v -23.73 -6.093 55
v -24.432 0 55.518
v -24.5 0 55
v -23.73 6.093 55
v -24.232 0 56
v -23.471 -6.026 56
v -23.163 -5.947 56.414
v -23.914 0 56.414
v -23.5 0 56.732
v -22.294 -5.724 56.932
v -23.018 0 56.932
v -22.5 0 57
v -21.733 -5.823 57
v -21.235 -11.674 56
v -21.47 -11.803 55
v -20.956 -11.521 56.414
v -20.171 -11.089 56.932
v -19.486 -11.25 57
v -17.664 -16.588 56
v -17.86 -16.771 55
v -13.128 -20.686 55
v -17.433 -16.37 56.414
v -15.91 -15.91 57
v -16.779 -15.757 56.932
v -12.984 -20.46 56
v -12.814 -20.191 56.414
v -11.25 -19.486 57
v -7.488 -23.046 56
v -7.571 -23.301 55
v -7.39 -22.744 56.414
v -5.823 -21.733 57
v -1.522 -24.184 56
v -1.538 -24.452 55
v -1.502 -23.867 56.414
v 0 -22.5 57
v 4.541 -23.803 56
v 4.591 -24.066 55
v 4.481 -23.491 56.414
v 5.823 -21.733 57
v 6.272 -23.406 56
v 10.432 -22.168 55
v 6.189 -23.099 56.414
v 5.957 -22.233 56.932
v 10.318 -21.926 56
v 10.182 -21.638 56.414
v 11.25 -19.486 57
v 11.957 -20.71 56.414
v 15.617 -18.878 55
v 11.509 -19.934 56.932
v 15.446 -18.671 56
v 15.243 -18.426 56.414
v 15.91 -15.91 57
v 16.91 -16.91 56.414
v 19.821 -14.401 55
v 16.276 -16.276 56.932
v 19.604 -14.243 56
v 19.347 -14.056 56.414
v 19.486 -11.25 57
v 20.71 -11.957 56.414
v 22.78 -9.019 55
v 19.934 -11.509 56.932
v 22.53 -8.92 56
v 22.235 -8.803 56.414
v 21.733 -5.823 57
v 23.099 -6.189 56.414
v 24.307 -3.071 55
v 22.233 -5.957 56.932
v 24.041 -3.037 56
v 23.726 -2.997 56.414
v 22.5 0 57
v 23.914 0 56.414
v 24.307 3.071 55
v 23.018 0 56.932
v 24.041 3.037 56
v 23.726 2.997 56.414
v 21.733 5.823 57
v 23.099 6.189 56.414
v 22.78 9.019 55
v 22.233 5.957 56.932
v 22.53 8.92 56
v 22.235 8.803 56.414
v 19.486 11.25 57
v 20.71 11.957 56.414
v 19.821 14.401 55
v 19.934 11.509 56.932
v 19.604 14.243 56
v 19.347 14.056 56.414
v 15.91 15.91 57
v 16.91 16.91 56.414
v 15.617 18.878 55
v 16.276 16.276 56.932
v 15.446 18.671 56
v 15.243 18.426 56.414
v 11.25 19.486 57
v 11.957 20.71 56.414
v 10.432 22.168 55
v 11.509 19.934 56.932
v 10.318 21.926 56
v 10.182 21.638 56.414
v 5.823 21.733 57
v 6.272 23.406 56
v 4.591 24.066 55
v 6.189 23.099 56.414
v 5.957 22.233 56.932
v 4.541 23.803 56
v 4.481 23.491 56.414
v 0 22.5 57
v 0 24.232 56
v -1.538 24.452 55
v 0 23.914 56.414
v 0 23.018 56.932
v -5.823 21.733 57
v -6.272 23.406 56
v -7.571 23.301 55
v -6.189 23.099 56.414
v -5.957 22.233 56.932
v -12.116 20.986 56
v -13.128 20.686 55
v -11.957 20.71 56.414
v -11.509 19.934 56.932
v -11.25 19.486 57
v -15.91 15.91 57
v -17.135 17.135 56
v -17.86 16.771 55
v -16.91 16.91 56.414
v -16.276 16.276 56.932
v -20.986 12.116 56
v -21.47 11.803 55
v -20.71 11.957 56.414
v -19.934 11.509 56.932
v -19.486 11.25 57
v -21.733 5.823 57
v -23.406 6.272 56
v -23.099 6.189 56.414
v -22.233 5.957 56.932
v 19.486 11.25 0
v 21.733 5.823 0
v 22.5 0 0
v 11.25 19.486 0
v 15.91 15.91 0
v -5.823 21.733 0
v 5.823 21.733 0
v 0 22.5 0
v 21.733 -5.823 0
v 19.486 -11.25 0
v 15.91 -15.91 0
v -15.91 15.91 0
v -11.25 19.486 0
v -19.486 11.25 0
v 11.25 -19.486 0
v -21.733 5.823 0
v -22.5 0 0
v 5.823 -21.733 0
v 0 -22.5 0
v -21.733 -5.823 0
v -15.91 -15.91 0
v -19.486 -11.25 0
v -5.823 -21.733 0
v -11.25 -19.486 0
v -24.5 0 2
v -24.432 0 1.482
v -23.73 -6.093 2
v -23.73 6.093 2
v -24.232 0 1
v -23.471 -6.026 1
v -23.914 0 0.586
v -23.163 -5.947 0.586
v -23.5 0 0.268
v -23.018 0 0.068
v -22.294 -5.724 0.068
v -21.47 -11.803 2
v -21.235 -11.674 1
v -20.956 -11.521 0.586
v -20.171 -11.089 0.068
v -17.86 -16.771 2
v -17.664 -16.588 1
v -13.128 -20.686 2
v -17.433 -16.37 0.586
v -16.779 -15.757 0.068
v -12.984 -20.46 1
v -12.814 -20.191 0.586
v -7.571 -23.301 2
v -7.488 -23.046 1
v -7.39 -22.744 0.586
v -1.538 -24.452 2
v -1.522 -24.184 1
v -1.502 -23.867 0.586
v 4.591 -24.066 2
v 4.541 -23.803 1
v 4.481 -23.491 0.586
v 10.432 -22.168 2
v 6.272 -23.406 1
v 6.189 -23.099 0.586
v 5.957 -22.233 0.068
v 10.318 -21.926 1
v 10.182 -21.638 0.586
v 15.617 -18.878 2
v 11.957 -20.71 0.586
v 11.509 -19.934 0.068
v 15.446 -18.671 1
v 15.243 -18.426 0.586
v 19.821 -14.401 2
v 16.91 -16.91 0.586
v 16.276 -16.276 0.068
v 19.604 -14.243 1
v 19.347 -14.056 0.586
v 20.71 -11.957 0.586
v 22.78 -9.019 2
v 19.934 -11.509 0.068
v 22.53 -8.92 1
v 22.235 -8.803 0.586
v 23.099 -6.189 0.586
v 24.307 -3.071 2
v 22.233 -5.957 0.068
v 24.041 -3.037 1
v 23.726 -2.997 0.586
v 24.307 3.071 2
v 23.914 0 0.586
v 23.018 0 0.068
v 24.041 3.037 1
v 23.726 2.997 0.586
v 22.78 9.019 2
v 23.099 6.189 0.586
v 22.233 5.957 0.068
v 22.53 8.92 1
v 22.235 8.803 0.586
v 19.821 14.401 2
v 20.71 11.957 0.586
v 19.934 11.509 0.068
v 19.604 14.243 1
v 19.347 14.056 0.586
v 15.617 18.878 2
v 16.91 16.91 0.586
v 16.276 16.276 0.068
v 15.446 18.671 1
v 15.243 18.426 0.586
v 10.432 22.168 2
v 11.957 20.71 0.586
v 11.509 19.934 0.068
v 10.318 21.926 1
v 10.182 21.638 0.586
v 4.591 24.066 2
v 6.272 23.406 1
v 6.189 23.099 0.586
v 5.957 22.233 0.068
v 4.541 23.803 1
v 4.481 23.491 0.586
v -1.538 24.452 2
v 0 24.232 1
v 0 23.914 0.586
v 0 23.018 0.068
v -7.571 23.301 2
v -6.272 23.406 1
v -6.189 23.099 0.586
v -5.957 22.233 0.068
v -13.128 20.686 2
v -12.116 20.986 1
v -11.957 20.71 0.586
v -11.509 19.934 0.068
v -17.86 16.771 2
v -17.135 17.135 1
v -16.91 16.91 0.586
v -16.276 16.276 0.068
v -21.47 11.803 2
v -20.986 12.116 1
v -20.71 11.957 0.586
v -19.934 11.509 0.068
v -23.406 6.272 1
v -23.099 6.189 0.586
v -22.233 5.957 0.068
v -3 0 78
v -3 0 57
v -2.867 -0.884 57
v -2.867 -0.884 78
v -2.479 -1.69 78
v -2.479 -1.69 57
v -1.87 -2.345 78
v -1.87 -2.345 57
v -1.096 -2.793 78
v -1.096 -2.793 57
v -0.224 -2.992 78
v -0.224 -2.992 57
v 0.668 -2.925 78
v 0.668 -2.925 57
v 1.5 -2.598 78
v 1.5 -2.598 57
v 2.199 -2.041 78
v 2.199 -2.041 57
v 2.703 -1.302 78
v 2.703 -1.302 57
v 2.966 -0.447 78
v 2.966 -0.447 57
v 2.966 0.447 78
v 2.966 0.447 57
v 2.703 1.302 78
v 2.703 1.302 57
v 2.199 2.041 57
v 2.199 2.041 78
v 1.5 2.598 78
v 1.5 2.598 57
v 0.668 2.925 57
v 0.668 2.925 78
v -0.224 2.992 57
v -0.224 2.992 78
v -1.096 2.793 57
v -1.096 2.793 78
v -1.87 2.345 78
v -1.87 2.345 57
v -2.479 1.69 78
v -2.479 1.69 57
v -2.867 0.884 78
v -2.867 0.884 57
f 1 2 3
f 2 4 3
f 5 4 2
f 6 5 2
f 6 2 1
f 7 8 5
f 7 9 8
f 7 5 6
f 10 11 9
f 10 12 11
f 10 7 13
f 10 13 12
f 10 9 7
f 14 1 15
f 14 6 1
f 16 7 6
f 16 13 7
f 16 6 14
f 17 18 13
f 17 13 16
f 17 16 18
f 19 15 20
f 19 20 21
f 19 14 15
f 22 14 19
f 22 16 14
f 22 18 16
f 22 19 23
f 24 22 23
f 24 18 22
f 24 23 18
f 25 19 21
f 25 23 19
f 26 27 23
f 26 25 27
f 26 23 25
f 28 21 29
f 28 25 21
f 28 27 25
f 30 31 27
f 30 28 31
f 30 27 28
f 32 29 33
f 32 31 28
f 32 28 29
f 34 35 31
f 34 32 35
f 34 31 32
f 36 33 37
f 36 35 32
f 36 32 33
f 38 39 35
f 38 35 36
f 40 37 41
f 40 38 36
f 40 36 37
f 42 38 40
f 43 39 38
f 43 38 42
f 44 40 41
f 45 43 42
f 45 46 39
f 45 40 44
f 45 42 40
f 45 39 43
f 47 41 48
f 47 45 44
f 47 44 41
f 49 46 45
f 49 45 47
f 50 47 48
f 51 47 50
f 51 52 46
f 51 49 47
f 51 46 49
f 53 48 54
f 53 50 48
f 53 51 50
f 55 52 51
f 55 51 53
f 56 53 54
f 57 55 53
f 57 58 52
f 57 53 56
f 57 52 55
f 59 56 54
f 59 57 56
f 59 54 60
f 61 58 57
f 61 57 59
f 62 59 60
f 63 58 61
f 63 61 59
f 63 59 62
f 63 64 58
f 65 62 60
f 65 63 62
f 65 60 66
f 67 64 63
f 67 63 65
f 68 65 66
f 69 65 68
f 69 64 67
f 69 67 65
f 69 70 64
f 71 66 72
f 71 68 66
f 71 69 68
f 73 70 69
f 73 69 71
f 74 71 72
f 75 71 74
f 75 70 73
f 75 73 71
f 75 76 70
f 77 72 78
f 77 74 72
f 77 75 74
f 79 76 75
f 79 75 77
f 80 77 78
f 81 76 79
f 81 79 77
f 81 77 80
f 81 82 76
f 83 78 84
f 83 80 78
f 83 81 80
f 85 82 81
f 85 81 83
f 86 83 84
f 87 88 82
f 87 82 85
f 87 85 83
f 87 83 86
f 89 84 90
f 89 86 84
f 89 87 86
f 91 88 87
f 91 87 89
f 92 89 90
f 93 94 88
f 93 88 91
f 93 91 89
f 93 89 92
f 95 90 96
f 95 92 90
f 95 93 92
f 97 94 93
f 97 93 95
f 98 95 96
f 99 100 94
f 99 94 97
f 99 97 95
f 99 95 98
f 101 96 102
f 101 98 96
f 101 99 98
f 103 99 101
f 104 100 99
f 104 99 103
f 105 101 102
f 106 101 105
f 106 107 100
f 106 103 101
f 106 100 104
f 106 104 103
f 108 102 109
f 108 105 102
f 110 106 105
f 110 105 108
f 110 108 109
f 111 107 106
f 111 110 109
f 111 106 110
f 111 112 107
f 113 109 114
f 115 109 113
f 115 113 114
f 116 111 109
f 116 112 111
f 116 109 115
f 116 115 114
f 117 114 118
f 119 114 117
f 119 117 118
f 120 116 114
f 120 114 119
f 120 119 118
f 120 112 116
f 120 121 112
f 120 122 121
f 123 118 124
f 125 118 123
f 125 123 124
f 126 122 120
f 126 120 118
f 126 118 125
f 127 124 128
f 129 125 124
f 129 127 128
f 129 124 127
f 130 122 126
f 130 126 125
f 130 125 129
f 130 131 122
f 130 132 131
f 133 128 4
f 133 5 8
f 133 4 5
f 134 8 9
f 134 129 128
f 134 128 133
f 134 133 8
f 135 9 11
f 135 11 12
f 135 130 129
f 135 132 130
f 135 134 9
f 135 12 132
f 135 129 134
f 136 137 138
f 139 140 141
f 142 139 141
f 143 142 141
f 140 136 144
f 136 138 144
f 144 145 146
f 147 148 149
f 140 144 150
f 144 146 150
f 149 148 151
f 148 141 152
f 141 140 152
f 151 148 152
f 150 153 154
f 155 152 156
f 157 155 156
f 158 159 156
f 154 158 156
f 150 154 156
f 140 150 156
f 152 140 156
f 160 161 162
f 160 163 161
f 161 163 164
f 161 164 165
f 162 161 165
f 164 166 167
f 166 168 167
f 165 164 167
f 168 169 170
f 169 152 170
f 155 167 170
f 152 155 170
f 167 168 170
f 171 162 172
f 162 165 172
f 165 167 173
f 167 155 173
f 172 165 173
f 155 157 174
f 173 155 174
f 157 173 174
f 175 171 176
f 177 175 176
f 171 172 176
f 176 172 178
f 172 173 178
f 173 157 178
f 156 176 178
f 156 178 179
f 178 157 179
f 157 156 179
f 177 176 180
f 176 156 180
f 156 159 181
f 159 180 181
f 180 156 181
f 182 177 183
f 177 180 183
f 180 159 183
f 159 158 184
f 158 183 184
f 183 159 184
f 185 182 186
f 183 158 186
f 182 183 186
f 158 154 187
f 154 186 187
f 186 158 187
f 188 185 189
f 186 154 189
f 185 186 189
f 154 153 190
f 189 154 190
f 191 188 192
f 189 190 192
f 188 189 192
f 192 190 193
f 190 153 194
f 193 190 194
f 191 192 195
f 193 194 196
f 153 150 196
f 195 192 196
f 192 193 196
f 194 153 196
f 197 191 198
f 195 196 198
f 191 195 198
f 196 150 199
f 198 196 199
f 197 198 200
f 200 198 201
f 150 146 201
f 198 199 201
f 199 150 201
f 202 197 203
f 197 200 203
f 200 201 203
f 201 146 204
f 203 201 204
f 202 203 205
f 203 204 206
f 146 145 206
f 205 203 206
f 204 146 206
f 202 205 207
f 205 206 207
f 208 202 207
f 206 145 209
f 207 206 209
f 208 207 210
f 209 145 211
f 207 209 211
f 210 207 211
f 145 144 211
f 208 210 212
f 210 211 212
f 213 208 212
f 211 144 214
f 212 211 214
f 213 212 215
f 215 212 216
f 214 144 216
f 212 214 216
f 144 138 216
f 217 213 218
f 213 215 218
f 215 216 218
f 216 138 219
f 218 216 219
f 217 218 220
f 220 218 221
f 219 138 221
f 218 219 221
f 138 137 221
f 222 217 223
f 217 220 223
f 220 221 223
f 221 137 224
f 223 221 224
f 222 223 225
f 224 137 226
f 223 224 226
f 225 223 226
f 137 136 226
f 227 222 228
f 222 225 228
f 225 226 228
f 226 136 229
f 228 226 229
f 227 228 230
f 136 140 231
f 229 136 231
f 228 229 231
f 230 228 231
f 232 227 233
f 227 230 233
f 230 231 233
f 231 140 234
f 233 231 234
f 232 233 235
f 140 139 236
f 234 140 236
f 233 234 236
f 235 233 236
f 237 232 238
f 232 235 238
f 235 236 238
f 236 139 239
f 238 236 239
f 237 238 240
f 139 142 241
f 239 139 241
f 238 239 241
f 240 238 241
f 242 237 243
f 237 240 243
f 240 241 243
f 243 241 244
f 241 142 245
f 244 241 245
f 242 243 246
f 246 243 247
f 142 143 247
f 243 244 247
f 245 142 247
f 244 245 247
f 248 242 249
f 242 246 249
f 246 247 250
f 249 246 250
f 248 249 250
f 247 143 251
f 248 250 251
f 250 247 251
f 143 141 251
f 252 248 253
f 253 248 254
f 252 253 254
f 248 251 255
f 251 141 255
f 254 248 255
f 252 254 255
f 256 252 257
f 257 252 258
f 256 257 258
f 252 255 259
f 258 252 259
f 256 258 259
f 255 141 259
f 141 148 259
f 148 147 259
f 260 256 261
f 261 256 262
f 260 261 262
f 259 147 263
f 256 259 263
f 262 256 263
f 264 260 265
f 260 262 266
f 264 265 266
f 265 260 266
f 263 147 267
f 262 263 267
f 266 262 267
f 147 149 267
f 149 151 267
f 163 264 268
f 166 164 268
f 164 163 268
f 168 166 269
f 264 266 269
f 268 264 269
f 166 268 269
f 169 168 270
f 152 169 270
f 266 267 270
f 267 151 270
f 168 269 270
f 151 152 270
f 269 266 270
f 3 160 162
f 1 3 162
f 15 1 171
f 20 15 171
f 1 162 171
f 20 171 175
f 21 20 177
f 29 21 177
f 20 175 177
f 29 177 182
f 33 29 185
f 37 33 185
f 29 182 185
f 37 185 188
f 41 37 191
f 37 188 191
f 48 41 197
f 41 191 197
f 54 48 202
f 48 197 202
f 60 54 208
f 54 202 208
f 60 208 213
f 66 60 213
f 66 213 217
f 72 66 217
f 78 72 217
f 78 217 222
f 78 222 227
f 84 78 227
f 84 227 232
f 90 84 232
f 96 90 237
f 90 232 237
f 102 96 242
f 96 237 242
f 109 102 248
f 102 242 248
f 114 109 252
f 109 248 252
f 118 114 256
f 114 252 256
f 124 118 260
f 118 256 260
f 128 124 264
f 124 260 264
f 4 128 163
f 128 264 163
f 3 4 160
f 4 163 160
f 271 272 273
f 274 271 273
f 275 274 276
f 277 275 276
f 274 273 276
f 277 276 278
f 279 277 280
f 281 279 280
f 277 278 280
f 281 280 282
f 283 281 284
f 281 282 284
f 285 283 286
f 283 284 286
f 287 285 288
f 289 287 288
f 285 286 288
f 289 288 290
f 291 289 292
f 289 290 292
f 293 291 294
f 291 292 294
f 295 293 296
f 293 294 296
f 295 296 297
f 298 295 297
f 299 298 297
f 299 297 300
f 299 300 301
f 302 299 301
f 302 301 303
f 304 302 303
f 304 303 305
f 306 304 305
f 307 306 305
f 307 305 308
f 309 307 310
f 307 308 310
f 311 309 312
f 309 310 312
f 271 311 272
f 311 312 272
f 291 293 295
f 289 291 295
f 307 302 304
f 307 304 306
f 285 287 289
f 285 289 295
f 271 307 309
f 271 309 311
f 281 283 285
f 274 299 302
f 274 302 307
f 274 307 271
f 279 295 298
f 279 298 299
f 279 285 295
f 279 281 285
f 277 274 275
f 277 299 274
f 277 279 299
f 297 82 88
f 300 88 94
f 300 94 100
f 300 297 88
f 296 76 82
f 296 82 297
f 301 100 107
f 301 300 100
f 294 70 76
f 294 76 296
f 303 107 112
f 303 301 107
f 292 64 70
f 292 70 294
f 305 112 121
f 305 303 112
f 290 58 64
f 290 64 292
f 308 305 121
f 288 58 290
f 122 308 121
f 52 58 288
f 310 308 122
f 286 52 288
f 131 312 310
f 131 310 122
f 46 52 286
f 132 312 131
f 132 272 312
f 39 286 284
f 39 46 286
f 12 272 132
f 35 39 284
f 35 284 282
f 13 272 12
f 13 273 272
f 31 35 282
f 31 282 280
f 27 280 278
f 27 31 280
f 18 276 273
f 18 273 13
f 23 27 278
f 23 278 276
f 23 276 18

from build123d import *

# Parameters (mm, degrees)
SKETCH1_R           = 24.5
BOSS_EXTRUDE1_DEPTH = 57
SKETCH2_R           = 3
BOSS_EXTRUDE2_DEPTH = 21
FILLET1_R           = 2


with BuildPart() as part:
    # Sketch1 → Boss-Extrude1 (new body)
    with BuildSketch(Plane.XY):
        with Locations(Location((0, 0, 0), (0, 0, 180))):
            Circle(SKETCH1_R)
    extrude(amount=BOSS_EXTRUDE1_DEPTH)

    # Sketch2 → Boss-Extrude2 (add)
    with BuildSketch(Plane.XY.offset(57)):
        with Locations(Location((0, 0, 0), (0, 0, 180))):
            Circle(SKETCH2_R)
    extrude(amount=BOSS_EXTRUDE2_DEPTH)

    # Fillet1
    fillet1_edges = [part.edges().sort_by_distance(p)[0] for p in [
        (24.5, 0, 0),
        (24.5, 0, 57),
    ]]
    fillet(fillet1_edges, radius=FILLET1_R)


solid = part.part
